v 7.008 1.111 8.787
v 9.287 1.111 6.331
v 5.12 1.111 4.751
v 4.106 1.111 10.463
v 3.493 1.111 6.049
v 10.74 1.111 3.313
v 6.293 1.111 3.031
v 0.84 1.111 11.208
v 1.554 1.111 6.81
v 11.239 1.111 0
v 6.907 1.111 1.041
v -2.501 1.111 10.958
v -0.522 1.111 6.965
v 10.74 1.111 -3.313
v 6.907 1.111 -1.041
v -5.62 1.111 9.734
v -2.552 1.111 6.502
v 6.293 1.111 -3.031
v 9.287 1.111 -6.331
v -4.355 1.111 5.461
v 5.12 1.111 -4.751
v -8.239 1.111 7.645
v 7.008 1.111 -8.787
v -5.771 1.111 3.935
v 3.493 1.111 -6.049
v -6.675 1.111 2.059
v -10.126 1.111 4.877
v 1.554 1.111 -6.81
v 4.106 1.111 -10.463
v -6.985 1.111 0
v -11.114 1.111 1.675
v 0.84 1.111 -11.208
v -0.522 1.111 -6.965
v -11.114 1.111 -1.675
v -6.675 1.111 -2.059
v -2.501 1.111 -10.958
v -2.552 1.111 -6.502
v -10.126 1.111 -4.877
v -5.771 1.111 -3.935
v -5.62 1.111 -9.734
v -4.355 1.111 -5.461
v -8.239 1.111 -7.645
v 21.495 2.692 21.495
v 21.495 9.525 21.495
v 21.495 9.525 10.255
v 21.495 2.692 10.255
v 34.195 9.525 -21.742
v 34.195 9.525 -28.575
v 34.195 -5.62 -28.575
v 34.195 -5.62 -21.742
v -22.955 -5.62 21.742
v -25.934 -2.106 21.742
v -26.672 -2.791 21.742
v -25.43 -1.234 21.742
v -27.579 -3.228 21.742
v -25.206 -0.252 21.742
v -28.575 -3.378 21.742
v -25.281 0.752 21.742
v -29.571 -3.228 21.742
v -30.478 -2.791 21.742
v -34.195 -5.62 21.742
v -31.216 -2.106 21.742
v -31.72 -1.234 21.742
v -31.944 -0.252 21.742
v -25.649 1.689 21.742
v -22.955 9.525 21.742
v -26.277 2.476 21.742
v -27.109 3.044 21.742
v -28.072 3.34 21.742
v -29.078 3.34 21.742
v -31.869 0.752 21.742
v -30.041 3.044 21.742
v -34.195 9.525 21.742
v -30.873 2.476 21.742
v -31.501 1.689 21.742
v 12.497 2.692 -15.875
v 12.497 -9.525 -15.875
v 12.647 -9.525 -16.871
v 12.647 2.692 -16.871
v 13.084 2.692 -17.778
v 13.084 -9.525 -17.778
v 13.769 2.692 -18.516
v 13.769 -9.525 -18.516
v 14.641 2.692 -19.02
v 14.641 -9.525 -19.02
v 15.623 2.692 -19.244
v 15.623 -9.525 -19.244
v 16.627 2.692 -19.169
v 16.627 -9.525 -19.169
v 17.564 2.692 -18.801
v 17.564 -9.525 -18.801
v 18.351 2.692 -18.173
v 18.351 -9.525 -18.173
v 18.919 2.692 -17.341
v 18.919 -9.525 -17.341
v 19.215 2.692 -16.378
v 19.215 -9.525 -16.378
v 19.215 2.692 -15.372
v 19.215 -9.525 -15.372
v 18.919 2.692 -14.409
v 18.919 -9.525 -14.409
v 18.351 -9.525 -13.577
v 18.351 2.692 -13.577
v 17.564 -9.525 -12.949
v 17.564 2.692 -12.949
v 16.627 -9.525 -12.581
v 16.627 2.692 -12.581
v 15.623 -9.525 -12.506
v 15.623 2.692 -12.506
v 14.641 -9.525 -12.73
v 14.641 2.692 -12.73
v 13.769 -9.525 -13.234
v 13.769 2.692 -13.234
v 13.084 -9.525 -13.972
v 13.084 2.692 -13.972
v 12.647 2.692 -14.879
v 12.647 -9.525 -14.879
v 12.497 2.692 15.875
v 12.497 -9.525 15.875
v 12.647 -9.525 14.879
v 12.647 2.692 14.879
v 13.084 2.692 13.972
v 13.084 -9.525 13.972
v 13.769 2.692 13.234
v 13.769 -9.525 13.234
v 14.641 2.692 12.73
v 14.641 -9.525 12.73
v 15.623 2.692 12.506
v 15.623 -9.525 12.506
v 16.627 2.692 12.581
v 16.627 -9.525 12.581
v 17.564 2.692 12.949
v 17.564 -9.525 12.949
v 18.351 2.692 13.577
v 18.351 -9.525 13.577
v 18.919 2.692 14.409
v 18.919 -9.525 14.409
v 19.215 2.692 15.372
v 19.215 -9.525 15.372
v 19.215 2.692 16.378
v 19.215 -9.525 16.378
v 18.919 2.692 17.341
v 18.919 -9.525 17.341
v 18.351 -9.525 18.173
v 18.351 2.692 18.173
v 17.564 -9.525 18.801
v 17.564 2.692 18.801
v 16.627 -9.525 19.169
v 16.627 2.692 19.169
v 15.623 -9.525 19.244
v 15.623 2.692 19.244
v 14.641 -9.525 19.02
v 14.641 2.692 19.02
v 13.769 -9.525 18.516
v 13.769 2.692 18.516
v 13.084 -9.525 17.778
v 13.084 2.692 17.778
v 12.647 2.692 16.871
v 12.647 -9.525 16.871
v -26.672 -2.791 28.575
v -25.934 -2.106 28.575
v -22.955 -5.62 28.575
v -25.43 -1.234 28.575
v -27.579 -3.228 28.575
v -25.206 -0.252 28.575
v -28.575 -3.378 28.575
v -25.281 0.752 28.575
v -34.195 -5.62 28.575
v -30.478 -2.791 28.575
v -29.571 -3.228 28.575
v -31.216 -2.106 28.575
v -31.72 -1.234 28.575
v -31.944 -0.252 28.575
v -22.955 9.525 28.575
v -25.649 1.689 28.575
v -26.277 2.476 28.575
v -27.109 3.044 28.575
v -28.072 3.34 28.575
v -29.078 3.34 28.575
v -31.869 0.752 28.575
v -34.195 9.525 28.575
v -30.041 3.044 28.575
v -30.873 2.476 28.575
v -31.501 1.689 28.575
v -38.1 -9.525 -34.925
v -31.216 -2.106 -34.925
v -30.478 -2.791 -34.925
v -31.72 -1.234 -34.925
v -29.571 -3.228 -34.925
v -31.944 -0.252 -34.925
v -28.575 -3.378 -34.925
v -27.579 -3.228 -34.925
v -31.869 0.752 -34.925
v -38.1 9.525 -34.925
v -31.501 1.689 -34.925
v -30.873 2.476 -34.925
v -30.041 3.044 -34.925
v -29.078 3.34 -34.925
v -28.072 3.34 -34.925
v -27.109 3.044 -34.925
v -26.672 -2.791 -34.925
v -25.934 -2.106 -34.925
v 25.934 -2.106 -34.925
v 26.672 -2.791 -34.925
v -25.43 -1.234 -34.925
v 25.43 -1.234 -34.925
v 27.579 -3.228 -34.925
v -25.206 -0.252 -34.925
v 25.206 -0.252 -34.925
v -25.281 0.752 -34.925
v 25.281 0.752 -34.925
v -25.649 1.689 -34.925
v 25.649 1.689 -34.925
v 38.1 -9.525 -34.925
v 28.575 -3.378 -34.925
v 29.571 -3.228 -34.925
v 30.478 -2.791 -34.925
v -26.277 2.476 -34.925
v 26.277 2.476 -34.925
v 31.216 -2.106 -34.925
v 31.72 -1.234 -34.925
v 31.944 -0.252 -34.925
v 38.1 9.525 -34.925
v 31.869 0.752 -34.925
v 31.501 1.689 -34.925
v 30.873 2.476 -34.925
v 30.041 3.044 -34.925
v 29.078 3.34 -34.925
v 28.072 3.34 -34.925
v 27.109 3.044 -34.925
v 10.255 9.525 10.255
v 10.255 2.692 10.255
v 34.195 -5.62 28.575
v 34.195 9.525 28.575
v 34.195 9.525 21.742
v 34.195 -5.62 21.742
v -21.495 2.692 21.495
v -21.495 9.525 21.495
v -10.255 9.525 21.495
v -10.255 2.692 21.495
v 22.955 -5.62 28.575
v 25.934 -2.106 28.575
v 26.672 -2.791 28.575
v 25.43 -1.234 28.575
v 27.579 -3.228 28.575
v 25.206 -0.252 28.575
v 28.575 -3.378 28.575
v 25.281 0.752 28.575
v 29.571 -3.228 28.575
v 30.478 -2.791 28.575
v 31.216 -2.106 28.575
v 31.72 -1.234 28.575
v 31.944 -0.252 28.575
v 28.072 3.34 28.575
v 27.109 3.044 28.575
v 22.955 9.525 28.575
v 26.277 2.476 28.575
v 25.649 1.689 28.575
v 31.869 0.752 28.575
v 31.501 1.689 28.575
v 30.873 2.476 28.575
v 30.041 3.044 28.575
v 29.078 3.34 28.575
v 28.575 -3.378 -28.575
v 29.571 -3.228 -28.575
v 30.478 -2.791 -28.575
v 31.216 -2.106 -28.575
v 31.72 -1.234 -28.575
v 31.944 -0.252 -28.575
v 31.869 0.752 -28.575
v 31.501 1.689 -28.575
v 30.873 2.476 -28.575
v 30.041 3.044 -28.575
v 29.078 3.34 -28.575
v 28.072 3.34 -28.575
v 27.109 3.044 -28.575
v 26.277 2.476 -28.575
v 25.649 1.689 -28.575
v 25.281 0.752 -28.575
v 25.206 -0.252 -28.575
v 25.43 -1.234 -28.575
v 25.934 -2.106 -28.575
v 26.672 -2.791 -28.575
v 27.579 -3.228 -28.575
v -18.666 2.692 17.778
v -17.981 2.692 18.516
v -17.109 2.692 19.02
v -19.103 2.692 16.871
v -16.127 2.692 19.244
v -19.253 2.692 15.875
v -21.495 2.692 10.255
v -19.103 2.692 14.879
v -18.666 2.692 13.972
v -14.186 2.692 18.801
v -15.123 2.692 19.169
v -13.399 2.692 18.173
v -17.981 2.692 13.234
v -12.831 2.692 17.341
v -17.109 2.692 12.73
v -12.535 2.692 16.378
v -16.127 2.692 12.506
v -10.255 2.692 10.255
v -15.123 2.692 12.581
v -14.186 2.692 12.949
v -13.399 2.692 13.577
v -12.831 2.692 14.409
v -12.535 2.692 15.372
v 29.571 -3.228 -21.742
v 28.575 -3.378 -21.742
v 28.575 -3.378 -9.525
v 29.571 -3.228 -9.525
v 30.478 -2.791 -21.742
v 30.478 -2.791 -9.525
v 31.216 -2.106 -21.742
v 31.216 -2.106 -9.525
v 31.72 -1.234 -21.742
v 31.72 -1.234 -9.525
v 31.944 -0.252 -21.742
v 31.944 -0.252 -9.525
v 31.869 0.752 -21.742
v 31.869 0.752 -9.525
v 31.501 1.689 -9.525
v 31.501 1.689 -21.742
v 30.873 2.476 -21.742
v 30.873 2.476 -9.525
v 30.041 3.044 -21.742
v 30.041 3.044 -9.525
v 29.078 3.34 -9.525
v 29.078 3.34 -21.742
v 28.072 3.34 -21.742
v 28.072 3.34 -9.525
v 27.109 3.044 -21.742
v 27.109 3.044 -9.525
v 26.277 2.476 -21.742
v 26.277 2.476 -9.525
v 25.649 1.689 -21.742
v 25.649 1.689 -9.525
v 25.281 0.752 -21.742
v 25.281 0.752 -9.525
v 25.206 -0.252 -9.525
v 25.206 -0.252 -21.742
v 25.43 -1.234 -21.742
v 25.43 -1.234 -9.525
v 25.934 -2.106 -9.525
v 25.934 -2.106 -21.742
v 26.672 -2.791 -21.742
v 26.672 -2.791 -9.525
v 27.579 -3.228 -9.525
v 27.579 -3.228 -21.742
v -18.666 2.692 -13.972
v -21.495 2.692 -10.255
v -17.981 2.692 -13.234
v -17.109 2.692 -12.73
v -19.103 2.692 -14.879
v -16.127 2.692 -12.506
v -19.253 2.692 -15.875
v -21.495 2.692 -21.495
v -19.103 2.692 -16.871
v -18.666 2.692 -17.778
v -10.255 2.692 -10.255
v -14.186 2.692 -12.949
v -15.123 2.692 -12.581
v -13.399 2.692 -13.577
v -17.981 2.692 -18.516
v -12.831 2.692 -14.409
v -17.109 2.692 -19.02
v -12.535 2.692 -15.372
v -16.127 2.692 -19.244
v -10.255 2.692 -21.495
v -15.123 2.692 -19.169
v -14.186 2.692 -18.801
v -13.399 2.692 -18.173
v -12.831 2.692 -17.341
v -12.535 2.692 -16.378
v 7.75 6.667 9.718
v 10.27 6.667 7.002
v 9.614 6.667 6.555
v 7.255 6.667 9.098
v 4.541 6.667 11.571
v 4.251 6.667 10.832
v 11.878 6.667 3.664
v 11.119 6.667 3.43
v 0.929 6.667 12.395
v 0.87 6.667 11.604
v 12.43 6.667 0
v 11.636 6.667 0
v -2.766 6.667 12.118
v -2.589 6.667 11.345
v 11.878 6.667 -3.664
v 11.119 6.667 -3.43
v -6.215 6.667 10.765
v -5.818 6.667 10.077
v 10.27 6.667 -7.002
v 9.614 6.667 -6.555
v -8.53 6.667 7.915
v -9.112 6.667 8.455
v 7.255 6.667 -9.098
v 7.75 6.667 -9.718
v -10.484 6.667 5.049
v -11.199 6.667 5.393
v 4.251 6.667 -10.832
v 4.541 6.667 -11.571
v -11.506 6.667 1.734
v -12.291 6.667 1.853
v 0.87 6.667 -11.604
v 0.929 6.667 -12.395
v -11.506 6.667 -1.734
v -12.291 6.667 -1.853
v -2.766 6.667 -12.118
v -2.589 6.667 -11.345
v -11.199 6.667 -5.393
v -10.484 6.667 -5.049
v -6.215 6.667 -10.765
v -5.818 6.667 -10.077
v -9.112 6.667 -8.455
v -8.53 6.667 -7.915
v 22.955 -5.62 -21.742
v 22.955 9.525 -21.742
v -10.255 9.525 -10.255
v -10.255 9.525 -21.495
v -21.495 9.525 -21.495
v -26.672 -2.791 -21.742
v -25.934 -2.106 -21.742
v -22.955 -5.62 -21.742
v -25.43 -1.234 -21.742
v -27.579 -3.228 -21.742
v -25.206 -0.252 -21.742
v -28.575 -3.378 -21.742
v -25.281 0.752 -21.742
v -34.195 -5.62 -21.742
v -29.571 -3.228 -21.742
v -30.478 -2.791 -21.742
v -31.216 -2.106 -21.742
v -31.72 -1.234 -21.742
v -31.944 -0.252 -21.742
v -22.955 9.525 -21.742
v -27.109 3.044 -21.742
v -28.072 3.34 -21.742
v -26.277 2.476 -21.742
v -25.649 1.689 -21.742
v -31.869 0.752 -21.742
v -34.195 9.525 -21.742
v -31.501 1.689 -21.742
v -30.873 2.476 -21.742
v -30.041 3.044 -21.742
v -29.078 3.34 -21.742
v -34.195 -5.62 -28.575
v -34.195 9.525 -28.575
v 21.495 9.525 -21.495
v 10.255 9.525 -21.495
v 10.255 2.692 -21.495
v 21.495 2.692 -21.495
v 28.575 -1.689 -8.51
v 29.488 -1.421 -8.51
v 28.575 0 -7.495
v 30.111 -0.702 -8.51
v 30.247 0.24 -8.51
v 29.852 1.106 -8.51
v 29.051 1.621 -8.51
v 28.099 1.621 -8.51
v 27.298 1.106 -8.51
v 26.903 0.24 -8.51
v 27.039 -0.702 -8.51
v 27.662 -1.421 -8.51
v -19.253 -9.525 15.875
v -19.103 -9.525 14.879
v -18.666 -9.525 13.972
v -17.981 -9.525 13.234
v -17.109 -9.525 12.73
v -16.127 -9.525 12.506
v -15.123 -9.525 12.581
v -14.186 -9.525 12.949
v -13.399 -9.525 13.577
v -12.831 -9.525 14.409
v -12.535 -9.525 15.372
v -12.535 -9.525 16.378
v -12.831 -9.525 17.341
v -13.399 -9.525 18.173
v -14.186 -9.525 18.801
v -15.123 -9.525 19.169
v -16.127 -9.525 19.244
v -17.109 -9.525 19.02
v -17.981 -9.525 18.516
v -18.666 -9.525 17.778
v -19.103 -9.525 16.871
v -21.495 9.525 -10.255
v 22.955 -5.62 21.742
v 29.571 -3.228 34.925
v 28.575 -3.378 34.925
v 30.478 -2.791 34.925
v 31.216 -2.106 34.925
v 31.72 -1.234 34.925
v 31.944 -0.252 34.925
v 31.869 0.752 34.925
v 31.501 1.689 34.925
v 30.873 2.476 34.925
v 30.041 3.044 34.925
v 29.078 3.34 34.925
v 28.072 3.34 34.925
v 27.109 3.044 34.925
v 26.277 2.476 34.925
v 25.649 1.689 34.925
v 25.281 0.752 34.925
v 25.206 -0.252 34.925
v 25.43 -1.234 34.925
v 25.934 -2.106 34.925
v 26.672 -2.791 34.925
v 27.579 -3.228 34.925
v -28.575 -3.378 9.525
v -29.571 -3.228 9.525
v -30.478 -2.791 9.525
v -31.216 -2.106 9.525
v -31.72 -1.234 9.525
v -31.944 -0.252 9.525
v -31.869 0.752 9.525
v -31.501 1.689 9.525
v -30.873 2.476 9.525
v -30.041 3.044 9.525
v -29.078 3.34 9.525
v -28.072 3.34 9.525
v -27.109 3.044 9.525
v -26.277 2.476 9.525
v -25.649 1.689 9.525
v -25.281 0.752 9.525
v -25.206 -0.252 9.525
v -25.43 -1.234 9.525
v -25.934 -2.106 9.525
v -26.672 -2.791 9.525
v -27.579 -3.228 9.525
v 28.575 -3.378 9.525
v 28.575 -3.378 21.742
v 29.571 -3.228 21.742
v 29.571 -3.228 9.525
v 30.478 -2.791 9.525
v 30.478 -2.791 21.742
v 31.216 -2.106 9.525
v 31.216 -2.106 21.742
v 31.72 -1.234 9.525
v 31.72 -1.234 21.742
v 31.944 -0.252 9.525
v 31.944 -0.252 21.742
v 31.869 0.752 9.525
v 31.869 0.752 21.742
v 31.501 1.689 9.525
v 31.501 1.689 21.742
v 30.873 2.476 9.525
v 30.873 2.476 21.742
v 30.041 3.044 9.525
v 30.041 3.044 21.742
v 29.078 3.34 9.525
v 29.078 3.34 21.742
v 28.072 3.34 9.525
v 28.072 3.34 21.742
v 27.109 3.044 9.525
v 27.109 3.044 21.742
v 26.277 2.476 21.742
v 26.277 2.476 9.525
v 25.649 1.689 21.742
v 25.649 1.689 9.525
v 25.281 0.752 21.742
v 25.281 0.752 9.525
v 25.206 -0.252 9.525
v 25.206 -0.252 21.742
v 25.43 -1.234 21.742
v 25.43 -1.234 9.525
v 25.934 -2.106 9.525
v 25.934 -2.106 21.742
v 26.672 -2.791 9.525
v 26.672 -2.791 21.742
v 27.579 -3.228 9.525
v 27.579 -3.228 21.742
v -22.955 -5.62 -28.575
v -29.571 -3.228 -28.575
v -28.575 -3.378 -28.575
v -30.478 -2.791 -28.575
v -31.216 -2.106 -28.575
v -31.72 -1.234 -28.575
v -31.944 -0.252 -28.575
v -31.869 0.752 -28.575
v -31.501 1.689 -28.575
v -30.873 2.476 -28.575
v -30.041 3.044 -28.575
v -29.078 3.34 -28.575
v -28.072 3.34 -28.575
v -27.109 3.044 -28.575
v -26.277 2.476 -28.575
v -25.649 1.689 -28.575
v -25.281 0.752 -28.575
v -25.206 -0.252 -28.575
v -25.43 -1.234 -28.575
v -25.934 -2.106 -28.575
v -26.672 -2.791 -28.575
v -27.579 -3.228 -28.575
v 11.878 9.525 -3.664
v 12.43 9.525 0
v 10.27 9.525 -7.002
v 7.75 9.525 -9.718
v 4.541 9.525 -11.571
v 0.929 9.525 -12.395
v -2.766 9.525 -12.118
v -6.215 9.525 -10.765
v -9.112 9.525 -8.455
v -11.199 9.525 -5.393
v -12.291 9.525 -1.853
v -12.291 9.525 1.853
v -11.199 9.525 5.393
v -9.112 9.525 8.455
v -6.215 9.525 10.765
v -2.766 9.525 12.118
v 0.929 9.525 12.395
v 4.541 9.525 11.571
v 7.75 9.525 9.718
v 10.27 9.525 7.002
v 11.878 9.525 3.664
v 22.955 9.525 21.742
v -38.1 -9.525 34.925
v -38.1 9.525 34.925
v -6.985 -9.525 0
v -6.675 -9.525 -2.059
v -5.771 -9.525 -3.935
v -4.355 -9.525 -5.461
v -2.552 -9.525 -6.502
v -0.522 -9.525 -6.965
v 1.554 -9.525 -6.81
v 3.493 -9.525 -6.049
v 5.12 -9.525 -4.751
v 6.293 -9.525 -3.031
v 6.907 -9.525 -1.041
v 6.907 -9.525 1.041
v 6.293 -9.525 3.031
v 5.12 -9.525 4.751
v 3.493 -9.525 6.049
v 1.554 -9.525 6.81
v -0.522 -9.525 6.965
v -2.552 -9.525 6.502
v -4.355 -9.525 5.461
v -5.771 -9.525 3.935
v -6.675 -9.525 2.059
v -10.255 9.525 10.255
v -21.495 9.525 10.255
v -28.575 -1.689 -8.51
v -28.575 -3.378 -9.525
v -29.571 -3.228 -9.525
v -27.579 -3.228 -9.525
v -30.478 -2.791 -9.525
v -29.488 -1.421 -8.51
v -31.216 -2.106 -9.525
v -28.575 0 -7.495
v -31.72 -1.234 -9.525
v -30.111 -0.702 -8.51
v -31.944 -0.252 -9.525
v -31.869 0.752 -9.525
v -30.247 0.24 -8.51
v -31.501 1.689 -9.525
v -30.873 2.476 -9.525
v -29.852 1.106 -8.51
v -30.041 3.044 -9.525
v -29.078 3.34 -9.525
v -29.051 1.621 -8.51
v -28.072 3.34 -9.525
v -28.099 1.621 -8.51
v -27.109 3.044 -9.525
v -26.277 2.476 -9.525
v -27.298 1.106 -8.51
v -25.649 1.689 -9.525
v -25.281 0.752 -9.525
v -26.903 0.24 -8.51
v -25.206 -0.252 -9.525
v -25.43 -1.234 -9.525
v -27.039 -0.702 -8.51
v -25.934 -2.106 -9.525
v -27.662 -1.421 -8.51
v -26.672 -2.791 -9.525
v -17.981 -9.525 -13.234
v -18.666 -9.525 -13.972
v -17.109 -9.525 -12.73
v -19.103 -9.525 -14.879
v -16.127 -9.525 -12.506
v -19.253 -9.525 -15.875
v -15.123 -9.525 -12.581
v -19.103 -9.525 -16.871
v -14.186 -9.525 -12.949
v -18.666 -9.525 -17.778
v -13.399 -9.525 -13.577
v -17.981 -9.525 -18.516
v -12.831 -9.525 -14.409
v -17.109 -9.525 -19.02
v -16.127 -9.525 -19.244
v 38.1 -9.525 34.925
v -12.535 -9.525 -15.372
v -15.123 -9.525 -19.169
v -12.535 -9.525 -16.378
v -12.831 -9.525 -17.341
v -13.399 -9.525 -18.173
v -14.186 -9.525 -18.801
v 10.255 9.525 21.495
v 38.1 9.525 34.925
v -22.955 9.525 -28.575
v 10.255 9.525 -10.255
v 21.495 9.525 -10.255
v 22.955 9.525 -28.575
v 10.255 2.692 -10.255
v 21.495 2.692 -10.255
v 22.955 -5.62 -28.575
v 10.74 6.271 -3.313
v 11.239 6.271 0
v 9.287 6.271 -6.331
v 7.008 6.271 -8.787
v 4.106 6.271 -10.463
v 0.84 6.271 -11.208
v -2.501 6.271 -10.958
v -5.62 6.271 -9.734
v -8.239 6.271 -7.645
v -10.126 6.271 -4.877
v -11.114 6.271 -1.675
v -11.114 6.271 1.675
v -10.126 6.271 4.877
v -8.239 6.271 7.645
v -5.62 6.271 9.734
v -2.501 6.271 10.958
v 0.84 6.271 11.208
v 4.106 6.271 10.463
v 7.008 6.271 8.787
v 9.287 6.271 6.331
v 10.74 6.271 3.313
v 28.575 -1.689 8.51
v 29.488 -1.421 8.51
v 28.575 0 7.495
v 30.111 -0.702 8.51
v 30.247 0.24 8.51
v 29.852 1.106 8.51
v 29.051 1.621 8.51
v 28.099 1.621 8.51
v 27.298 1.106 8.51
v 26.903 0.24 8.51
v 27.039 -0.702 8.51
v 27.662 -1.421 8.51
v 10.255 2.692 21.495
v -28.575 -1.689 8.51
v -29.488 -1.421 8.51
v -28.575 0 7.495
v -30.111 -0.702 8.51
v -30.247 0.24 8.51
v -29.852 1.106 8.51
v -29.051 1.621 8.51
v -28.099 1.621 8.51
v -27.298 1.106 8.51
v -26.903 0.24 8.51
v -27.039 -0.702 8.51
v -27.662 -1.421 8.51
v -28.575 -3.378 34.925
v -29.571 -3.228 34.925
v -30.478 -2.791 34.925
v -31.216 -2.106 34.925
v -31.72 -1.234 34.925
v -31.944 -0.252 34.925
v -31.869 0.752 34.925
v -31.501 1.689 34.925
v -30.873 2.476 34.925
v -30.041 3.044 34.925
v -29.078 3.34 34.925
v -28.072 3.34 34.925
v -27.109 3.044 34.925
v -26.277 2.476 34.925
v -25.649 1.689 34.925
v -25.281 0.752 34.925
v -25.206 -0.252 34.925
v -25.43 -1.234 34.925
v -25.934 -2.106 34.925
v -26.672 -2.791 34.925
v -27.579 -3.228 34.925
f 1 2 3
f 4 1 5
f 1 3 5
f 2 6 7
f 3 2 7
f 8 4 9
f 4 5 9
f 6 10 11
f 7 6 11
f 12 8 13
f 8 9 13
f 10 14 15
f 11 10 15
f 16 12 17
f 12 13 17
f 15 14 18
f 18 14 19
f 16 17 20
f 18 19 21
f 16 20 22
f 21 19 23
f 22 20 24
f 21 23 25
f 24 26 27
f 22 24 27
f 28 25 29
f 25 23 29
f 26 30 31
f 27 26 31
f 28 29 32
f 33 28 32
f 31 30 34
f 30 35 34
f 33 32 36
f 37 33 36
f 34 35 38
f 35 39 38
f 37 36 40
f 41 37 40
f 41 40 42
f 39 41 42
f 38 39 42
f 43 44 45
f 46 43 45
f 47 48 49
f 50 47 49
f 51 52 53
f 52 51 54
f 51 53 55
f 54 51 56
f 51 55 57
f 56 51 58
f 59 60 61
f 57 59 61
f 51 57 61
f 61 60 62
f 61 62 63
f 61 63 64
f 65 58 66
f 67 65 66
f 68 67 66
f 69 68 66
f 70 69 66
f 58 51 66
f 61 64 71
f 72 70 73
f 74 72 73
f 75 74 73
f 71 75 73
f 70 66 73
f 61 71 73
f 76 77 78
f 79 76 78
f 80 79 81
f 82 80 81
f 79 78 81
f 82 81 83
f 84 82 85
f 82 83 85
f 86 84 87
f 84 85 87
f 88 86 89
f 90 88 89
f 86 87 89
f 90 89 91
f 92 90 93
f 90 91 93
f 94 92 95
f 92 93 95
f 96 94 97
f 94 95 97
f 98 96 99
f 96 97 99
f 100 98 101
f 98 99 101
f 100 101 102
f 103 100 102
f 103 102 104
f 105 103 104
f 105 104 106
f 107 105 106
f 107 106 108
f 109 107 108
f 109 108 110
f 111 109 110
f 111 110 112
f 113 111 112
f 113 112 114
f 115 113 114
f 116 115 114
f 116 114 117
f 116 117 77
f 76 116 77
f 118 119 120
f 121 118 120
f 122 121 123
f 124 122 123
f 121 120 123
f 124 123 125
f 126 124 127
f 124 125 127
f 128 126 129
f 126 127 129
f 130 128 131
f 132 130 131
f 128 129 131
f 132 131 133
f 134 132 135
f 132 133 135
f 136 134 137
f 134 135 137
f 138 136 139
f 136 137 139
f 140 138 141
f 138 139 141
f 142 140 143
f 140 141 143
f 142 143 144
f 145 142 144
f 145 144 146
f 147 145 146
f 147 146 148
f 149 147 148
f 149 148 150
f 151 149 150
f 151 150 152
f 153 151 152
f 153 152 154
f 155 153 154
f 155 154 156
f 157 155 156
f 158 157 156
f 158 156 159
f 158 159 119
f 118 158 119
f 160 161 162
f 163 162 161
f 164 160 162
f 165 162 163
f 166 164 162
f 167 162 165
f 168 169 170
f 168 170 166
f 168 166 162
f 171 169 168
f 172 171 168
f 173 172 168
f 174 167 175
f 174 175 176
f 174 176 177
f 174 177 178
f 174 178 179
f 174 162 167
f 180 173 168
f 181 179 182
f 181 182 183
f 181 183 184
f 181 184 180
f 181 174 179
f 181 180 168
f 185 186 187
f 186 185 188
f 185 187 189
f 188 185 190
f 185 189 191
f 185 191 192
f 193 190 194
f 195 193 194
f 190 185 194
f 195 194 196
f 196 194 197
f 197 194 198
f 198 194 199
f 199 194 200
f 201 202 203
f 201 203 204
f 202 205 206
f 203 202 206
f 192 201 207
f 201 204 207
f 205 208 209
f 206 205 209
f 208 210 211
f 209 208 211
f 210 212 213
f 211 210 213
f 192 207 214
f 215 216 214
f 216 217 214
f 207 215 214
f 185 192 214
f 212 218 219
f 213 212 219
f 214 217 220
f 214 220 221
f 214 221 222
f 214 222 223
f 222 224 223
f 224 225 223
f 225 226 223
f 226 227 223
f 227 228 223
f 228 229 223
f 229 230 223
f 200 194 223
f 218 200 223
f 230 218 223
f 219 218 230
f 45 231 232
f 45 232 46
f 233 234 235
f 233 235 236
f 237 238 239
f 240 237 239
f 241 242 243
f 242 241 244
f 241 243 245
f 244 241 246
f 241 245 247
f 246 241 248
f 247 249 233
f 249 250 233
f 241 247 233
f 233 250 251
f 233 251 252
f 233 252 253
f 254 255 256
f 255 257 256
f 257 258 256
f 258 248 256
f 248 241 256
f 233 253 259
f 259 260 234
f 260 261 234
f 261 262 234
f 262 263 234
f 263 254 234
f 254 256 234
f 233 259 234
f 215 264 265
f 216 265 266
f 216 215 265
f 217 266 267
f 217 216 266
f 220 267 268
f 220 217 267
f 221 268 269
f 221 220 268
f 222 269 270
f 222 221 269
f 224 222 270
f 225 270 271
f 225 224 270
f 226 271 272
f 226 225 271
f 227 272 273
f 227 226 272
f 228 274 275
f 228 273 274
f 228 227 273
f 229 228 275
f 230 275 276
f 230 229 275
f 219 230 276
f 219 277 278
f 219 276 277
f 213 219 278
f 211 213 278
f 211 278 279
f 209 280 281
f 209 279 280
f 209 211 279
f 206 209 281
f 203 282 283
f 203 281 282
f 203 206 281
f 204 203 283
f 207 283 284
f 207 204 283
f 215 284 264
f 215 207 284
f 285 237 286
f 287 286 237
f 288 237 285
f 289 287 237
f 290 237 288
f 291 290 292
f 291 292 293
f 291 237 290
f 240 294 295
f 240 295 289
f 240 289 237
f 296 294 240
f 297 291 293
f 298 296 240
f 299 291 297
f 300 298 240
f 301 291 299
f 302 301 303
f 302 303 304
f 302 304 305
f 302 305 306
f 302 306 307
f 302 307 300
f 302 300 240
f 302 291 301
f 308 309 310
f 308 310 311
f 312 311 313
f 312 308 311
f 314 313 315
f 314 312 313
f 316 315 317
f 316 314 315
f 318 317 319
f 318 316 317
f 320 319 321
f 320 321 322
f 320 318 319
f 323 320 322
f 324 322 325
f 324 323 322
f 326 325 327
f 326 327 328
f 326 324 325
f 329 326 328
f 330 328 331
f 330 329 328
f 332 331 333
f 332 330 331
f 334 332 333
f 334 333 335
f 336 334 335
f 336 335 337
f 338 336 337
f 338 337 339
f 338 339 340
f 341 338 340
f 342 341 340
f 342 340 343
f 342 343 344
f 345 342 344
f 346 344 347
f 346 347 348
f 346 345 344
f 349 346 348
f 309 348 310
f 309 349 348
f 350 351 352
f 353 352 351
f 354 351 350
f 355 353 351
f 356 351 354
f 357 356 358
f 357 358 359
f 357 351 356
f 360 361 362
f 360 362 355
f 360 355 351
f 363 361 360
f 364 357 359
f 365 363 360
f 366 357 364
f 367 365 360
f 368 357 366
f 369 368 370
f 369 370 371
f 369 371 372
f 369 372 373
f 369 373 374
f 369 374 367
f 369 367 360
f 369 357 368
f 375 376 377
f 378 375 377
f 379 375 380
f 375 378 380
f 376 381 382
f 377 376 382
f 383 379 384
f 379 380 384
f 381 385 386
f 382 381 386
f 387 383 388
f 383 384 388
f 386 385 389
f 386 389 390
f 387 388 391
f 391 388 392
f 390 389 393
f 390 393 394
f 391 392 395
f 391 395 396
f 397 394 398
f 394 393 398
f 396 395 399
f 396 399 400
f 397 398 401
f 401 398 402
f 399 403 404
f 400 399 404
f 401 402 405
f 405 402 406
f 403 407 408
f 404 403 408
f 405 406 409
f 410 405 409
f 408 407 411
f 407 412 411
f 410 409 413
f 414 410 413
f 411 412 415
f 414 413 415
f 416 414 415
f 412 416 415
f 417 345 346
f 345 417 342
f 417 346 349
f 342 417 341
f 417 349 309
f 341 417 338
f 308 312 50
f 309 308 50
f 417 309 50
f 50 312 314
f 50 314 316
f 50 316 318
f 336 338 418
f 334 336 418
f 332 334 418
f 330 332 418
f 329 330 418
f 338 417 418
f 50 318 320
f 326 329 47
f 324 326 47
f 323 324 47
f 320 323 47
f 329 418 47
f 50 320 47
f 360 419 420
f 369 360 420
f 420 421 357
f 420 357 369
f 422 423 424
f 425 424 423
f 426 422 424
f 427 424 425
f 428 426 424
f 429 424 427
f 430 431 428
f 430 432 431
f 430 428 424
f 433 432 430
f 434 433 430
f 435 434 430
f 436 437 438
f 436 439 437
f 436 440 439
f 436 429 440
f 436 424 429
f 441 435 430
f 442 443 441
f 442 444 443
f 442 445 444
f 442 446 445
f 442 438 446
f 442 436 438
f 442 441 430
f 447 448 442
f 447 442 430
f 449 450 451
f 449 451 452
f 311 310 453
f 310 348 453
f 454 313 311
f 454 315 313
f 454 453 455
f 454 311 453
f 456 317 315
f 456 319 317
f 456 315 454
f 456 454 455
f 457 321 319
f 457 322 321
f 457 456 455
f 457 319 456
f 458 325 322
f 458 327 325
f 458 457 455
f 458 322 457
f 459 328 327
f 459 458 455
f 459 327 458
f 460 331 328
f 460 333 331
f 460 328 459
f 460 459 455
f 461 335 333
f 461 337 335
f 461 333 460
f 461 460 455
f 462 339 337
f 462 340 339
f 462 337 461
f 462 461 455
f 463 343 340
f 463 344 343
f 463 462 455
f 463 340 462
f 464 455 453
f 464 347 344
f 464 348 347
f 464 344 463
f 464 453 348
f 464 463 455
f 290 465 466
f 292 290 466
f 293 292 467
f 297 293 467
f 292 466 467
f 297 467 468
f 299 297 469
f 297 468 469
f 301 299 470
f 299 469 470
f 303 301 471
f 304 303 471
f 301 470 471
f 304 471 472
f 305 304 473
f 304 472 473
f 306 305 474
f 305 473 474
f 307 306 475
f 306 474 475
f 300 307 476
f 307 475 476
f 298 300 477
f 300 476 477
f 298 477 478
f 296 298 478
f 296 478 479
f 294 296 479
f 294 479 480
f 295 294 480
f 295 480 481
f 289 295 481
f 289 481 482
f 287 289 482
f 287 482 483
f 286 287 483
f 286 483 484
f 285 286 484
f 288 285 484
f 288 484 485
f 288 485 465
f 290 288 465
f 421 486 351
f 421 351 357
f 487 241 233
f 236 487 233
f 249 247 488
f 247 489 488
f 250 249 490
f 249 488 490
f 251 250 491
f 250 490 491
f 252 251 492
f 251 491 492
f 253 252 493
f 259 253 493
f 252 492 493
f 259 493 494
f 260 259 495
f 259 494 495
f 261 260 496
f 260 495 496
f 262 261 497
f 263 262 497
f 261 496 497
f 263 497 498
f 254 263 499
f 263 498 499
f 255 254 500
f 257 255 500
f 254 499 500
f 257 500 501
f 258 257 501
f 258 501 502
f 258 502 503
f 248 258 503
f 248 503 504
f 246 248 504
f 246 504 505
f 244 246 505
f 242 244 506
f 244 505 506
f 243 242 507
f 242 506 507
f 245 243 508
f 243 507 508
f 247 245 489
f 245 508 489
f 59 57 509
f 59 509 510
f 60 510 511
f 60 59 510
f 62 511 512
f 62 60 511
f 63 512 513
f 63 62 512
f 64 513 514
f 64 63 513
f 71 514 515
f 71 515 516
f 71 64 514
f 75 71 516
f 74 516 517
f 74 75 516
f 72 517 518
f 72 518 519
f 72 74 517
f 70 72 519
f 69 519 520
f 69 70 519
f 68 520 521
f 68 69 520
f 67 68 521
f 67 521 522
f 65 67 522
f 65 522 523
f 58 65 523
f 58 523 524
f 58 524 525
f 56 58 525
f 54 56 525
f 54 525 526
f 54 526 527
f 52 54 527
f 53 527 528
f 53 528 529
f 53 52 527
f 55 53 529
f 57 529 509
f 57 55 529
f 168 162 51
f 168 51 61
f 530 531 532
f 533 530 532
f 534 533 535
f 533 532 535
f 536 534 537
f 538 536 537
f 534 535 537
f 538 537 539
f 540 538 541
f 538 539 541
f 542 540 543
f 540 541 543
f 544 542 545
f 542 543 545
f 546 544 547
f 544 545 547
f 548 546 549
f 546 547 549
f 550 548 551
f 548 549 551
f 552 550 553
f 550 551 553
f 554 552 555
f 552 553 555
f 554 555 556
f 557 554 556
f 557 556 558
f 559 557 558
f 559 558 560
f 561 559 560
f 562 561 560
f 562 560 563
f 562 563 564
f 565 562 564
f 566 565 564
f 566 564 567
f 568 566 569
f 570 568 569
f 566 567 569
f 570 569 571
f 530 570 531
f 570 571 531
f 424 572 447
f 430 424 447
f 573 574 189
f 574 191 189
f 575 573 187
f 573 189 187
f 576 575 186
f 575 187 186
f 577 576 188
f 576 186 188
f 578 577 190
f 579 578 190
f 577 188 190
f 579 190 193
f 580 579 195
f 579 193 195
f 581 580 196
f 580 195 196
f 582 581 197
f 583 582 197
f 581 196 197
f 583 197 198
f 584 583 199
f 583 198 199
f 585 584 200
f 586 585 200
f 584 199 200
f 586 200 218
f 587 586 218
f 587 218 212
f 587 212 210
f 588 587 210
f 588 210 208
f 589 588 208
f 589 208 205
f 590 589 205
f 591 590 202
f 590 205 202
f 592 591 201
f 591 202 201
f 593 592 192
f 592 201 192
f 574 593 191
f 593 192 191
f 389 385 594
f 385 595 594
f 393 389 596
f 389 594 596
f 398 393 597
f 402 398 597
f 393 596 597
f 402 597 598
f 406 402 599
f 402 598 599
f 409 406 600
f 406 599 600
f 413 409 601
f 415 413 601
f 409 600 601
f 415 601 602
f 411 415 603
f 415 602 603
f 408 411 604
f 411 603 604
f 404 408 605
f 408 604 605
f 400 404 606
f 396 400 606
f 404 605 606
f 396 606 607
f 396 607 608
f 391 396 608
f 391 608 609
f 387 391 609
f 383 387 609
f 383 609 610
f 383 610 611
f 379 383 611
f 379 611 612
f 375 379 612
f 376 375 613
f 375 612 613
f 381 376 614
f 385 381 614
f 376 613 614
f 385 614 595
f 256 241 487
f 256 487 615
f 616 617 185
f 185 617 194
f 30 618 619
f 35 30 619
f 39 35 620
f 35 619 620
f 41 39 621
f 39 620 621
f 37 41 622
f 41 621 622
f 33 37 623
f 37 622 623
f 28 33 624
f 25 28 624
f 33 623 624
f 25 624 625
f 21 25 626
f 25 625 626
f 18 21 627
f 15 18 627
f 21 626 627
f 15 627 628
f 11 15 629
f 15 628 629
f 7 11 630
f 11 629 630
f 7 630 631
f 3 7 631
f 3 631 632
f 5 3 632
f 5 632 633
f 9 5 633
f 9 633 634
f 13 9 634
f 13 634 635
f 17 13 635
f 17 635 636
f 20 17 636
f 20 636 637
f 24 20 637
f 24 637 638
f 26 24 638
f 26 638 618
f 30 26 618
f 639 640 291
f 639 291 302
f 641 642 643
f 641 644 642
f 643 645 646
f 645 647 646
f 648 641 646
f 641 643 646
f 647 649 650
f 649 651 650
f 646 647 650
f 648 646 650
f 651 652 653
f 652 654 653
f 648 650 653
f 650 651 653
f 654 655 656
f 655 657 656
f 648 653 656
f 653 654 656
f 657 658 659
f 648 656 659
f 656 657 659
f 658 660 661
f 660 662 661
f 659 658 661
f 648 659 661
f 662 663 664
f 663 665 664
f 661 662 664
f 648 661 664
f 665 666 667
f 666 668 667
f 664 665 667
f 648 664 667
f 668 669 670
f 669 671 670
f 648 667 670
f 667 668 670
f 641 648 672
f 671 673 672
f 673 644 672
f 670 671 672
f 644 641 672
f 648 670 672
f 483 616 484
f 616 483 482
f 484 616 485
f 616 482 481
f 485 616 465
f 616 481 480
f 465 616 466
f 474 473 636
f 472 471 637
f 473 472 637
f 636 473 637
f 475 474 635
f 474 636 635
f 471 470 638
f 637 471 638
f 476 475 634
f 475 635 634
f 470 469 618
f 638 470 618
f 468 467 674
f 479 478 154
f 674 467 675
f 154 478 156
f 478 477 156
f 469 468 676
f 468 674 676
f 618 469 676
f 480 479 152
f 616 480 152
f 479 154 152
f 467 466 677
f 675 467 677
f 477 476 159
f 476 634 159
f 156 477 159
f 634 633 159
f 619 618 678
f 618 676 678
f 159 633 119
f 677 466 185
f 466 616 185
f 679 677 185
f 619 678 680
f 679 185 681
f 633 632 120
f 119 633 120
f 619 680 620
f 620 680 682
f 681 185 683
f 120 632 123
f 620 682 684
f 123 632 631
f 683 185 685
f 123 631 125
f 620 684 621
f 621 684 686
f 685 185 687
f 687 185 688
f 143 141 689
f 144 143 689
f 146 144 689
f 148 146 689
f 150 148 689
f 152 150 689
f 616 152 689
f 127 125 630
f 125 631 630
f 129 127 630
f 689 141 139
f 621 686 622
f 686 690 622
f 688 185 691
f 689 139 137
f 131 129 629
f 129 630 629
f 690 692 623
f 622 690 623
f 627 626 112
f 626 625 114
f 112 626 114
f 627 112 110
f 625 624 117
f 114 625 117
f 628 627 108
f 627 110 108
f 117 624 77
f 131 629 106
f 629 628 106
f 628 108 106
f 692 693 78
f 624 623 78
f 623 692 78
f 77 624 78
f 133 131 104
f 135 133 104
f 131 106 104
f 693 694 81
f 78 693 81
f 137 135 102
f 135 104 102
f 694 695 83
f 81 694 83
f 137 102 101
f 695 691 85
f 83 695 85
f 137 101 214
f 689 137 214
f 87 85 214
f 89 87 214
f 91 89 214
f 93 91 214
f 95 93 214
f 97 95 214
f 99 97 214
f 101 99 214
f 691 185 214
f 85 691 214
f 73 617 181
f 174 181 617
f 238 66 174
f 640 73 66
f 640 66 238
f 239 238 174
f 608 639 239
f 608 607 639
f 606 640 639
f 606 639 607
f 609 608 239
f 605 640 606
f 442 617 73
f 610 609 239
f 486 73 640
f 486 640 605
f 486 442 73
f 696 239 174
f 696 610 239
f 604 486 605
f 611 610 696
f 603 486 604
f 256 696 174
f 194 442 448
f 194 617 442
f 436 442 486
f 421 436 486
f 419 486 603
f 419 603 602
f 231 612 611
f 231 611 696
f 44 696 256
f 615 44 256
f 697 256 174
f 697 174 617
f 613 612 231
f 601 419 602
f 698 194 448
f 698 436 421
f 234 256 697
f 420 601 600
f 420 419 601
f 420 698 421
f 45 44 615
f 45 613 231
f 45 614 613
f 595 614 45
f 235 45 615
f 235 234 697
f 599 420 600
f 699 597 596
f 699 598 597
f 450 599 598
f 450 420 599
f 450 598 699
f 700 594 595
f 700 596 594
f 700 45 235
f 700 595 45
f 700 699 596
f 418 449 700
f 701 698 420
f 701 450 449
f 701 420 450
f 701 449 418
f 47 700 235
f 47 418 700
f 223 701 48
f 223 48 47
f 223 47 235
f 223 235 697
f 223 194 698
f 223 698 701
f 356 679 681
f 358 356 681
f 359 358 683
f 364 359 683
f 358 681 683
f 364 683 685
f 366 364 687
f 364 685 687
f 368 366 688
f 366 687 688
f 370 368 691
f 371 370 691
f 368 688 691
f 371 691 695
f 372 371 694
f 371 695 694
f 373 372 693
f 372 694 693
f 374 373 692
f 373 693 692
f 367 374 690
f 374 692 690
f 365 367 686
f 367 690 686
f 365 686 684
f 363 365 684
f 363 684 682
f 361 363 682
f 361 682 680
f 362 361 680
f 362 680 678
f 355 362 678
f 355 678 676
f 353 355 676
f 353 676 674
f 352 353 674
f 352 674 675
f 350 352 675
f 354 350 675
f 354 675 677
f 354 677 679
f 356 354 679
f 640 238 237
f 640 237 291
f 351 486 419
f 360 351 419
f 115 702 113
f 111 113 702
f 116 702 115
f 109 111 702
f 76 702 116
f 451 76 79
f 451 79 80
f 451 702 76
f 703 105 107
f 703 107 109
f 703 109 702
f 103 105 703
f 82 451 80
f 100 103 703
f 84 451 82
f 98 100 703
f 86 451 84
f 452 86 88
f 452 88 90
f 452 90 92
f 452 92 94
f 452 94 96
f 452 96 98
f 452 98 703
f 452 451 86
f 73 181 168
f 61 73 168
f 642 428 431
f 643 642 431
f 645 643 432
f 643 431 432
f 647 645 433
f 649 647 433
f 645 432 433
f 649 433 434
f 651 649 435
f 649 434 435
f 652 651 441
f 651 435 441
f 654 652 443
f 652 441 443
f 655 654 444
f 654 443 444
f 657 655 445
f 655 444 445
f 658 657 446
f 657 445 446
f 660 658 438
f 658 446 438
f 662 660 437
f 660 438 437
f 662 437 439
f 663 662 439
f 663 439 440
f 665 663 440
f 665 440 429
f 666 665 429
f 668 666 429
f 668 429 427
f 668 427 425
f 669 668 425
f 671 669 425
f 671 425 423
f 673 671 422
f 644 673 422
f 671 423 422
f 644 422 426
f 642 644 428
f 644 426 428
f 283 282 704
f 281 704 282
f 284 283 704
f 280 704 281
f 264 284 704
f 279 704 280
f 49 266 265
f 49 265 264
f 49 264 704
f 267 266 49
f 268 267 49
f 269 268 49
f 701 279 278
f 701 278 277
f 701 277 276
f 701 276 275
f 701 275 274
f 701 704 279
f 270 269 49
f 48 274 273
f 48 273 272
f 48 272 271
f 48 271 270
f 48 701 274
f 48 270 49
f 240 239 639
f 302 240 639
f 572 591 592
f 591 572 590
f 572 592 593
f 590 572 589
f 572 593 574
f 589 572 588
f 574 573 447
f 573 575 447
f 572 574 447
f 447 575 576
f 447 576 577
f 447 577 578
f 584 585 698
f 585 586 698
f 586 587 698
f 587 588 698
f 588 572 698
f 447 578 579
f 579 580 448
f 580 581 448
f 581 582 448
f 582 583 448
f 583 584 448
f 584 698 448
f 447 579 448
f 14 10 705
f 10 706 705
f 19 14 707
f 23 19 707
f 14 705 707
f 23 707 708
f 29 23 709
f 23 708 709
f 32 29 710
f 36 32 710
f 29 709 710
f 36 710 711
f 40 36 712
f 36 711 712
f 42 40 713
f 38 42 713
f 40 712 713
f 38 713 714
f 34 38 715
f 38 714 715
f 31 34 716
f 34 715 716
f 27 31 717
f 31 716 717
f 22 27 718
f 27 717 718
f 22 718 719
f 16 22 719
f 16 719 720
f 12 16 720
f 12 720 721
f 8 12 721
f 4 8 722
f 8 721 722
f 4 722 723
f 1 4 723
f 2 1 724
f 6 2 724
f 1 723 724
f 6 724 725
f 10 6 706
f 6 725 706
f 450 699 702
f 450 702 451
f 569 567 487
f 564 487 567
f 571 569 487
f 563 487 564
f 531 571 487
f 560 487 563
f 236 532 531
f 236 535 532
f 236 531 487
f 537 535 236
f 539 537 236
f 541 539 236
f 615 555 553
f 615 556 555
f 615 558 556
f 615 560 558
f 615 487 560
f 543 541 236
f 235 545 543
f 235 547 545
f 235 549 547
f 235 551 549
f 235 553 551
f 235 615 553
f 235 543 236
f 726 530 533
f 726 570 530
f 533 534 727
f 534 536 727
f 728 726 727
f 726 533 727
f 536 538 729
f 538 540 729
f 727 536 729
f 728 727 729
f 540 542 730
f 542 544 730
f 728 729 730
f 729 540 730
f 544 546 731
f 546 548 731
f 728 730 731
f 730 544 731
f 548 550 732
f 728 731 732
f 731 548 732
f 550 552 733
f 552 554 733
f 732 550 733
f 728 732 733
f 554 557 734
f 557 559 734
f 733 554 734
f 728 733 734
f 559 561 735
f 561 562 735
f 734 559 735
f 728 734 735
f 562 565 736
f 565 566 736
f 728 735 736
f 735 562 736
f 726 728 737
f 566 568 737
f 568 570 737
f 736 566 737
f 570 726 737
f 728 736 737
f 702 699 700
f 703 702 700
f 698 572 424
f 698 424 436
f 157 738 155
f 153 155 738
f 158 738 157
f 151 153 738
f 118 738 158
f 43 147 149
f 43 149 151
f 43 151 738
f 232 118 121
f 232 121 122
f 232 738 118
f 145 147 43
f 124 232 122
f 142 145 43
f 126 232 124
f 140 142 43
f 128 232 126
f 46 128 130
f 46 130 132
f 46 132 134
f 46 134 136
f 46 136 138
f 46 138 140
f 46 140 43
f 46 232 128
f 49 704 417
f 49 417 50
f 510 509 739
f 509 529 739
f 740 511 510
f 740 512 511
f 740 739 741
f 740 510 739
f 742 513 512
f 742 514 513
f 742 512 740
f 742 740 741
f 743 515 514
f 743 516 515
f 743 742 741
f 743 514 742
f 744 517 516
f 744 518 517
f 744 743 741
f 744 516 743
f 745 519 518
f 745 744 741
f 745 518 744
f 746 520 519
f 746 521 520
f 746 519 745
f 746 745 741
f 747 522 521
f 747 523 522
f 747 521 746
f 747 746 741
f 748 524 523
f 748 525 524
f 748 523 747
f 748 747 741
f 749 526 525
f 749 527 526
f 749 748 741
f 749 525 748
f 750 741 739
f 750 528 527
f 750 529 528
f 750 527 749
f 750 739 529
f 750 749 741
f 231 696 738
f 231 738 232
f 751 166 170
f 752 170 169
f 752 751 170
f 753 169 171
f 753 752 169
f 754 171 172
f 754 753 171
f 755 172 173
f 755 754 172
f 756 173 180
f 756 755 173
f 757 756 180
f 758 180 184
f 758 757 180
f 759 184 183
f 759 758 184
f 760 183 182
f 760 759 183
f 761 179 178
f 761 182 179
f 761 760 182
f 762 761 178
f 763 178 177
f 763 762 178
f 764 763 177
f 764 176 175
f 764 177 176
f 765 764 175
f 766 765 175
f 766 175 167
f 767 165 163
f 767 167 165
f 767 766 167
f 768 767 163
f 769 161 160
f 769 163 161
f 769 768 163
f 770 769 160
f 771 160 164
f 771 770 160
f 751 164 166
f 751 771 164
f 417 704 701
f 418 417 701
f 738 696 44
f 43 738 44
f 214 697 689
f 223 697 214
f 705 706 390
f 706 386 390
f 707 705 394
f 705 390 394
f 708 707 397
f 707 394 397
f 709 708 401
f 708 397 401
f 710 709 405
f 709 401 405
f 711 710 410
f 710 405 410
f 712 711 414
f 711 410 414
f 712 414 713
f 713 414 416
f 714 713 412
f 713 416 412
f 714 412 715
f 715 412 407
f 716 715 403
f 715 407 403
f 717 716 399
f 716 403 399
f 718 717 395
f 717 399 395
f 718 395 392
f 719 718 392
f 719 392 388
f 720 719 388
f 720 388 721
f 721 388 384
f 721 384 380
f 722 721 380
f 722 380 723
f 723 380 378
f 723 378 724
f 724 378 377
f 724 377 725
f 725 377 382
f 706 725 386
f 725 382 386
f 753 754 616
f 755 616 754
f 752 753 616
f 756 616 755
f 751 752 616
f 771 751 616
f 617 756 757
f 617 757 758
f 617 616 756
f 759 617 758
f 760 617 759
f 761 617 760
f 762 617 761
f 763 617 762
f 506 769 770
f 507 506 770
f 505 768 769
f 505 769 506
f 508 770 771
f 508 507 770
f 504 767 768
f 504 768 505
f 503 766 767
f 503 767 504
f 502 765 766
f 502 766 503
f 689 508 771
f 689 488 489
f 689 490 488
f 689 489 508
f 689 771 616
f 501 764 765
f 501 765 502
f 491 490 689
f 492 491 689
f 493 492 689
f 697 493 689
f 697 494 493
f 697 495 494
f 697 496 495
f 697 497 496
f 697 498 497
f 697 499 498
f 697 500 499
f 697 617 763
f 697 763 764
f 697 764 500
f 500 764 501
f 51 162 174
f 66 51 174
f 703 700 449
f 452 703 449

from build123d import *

# Parameters (mm, degrees)
SKETCH1_W               = 76.2
SKETCH1_H               = 69.85
BOSS_EXTRUDE1_DEPTH     = 9.525
F_1_4_CLEARANCE_HOLE1_D = 6.7564
SKETCH5_W               = 11.2395
SKETCH5_H               = 11.2395
CUT_EXTRUDE1_DEPTH      = 6.8326
F_3_8_CLEARANCE_HOLE1_D = 13.97
CUT_EXTRUDE2_START      = -6.35
CUT_EXTRUDE2_DEPTH      = 6.8326
MIRROR2_START           = -6.35
MIRROR2_COPY_2_DEPTH    = 6.8326


with BuildPart() as part:
    # Sketch1 → Boss-Extrude1 (new, symmetric)
    with BuildSketch(Plane(origin=(0, 0, 0), x_dir=(1, 0, 0), z_dir=(0, 1, 0))):
        Rectangle(SKETCH1_W, SKETCH1_H)
    extrude(amount=BOSS_EXTRUDE1_DEPTH, both=True)

    # 1/4 Clearance Hole1 (through all)
    with Locations(Plane(origin=(0, 9.525, 0), x_dir=(1, 0, 0), z_dir=(0, 1, 0))):
        with Locations((-15.875, 15.875)):
            f_1_4_clearance_hole1 = Hole(F_1_4_CLEARANCE_HOLE1_D / 2)

    # Sketch5 → Cut-Extrude1 (cut)
    with BuildSketch(Plane(origin=(0, 9.525, 0), x_dir=(1, 0, 0), z_dir=(0, 1, 0))):
        with Locations((-15.875, 15.875)):
            Rectangle(SKETCH5_W, SKETCH5_H)
    cut_extrude1 = extrude(amount=-CUT_EXTRUDE1_DEPTH, mode=Mode.SUBTRACT)

    # Sketch-Pattern1: 1/4 Clearance Hole1, Cut-Extrude1 at 3 more places
    with Locations((31.75, 0, 0), (31.75, 0, 31.75), (0, 0, 31.75)):
        add(f_1_4_clearance_hole1, mode=Mode.SUBTRACT)
        add(cut_extrude1, mode=Mode.SUBTRACT)

    # 3/8 Clearance Hole1 (through all)
    with Locations(Plane(origin=(0, 9.525, 0), x_dir=(1, 0, 0), z_dir=(0, 1, 0))):
        with Locations((0, 0)):
            Hole(F_3_8_CLEARANCE_HOLE1_D / 2)


with BuildPart() as body_2:
    # uxcell-FR6ZZ: read off the stored shape, not the designer's step
    # uxcell-FR6ZZ outline → uxcell-FR6ZZ (revolve)
    with BuildSketch(Plane(origin=(-26.978230937, 0, 2.629647059), x_dir=(1, 0, 0), z_dir=(0, 0, 1))):
        Polygon((12.430125, 16.66875), (4.7625, 16.66875), (4.7625, 8.255), (11.2395, 8.255), (11.2395, 13.414375), (11.636375, 13.81125), (12.430125, 13.81125), align=None)
    revolve(axis=Axis((-26.978230937, 0, 2.629647059), (0, 1, 0)))


with BuildPart() as body_2_1:
    # Body-Move/Copy2: read off the stored shape, not the designer's step
    # Body-Move/Copy2: moved
    add(body_2.part.moved(Location((26.9782309, -7.14375, -2.6296471))))


with BuildPart() as part_1:
    add(part.part)

    # Combine1: cut body 2
    add(body_2_1.part, mode=Mode.SUBTRACT)

    # Sketch11 → 1/4 Clearance Hole2 (revolve, cut)
    with BuildSketch(Plane(origin=(-28.575, 0, 34.925), x_dir=(0, -1, 0), z_dir=(1, 0, 0))):
        Polygon((0, 0), (0, 27.429827343), (3.3782, 25.4), (3.3782, 0), align=None)
    f_1_4_clearance_hole2 = revolve(axis=Axis((-28.575, 0, 41.275), (0, 0, -1)), mode=Mode.SUBTRACT)

    # Sketch13 → Cut-Extrude2 (cut)
    with BuildSketch(Plane.XY.offset(34.925).offset(CUT_EXTRUDE2_START)):
        Polygon((-34.19475, 5.61975), (-34.19475, 9.525), (-22.95525, 9.525), (-22.95525, 5.61975), (-22.95525, -5.61975), (-34.19475, -5.61975), align=None)
    cut_extrude2 = extrude(amount=-CUT_EXTRUDE2_DEPTH, mode=Mode.SUBTRACT)

    # Mirror1: 1/4 Clearance Hole2, Cut-Extrude2 across plane
    add(f_1_4_clearance_hole2.mirror(Plane(origin=(0, 0, 0), x_dir=(0, 0, 1), z_dir=(1, 0, 0))), mode=Mode.SUBTRACT)
    add(cut_extrude2.mirror(Plane(origin=(0, 0, 0), x_dir=(0, 0, 1), z_dir=(1, 0, 0))), mode=Mode.SUBTRACT)

    # Mirror2: 1/4 Clearance Hole2, Cut-Extrude2 across plane
    add(f_1_4_clearance_hole2.mirror(Plane.XY), mode=Mode.SUBTRACT)
    add(cut_extrude2.mirror(Plane.XY), mode=Mode.SUBTRACT)

    # Mirror2 copy 1 sketch → Mirror2 copy 1 (revolve, cut)
    with BuildSketch(Plane(origin=(28.575, 0, -34.925), x_dir=(0, -1, 0), z_dir=(-1, 0, 0))):
        Polygon((0, 0), (0, 27.429827343), (3.3782, 25.4), (3.3782, 0), align=None)
    revolve(axis=Axis((28.575, 0, -41.275), (0, 0, 1)), mode=Mode.SUBTRACT)

    # Mirror2 copy 2 sketch → Mirror2 copy 2 (cut)
    with BuildSketch(Plane(origin=(0, 0, -34.925), x_dir=(-1, 0, 0), z_dir=(0, 0, -1)).offset(MIRROR2_START)):
        Polygon((-34.19475, 5.61975), (-34.19475, 9.525), (-22.95525, 9.525), (-22.95525, 5.61975), (-22.95525, -5.61975), (-34.19475, -5.61975), align=None)
    extrude(amount=-MIRROR2_COPY_2_DEPTH, mode=Mode.SUBTRACT)


solid = part_1.part
